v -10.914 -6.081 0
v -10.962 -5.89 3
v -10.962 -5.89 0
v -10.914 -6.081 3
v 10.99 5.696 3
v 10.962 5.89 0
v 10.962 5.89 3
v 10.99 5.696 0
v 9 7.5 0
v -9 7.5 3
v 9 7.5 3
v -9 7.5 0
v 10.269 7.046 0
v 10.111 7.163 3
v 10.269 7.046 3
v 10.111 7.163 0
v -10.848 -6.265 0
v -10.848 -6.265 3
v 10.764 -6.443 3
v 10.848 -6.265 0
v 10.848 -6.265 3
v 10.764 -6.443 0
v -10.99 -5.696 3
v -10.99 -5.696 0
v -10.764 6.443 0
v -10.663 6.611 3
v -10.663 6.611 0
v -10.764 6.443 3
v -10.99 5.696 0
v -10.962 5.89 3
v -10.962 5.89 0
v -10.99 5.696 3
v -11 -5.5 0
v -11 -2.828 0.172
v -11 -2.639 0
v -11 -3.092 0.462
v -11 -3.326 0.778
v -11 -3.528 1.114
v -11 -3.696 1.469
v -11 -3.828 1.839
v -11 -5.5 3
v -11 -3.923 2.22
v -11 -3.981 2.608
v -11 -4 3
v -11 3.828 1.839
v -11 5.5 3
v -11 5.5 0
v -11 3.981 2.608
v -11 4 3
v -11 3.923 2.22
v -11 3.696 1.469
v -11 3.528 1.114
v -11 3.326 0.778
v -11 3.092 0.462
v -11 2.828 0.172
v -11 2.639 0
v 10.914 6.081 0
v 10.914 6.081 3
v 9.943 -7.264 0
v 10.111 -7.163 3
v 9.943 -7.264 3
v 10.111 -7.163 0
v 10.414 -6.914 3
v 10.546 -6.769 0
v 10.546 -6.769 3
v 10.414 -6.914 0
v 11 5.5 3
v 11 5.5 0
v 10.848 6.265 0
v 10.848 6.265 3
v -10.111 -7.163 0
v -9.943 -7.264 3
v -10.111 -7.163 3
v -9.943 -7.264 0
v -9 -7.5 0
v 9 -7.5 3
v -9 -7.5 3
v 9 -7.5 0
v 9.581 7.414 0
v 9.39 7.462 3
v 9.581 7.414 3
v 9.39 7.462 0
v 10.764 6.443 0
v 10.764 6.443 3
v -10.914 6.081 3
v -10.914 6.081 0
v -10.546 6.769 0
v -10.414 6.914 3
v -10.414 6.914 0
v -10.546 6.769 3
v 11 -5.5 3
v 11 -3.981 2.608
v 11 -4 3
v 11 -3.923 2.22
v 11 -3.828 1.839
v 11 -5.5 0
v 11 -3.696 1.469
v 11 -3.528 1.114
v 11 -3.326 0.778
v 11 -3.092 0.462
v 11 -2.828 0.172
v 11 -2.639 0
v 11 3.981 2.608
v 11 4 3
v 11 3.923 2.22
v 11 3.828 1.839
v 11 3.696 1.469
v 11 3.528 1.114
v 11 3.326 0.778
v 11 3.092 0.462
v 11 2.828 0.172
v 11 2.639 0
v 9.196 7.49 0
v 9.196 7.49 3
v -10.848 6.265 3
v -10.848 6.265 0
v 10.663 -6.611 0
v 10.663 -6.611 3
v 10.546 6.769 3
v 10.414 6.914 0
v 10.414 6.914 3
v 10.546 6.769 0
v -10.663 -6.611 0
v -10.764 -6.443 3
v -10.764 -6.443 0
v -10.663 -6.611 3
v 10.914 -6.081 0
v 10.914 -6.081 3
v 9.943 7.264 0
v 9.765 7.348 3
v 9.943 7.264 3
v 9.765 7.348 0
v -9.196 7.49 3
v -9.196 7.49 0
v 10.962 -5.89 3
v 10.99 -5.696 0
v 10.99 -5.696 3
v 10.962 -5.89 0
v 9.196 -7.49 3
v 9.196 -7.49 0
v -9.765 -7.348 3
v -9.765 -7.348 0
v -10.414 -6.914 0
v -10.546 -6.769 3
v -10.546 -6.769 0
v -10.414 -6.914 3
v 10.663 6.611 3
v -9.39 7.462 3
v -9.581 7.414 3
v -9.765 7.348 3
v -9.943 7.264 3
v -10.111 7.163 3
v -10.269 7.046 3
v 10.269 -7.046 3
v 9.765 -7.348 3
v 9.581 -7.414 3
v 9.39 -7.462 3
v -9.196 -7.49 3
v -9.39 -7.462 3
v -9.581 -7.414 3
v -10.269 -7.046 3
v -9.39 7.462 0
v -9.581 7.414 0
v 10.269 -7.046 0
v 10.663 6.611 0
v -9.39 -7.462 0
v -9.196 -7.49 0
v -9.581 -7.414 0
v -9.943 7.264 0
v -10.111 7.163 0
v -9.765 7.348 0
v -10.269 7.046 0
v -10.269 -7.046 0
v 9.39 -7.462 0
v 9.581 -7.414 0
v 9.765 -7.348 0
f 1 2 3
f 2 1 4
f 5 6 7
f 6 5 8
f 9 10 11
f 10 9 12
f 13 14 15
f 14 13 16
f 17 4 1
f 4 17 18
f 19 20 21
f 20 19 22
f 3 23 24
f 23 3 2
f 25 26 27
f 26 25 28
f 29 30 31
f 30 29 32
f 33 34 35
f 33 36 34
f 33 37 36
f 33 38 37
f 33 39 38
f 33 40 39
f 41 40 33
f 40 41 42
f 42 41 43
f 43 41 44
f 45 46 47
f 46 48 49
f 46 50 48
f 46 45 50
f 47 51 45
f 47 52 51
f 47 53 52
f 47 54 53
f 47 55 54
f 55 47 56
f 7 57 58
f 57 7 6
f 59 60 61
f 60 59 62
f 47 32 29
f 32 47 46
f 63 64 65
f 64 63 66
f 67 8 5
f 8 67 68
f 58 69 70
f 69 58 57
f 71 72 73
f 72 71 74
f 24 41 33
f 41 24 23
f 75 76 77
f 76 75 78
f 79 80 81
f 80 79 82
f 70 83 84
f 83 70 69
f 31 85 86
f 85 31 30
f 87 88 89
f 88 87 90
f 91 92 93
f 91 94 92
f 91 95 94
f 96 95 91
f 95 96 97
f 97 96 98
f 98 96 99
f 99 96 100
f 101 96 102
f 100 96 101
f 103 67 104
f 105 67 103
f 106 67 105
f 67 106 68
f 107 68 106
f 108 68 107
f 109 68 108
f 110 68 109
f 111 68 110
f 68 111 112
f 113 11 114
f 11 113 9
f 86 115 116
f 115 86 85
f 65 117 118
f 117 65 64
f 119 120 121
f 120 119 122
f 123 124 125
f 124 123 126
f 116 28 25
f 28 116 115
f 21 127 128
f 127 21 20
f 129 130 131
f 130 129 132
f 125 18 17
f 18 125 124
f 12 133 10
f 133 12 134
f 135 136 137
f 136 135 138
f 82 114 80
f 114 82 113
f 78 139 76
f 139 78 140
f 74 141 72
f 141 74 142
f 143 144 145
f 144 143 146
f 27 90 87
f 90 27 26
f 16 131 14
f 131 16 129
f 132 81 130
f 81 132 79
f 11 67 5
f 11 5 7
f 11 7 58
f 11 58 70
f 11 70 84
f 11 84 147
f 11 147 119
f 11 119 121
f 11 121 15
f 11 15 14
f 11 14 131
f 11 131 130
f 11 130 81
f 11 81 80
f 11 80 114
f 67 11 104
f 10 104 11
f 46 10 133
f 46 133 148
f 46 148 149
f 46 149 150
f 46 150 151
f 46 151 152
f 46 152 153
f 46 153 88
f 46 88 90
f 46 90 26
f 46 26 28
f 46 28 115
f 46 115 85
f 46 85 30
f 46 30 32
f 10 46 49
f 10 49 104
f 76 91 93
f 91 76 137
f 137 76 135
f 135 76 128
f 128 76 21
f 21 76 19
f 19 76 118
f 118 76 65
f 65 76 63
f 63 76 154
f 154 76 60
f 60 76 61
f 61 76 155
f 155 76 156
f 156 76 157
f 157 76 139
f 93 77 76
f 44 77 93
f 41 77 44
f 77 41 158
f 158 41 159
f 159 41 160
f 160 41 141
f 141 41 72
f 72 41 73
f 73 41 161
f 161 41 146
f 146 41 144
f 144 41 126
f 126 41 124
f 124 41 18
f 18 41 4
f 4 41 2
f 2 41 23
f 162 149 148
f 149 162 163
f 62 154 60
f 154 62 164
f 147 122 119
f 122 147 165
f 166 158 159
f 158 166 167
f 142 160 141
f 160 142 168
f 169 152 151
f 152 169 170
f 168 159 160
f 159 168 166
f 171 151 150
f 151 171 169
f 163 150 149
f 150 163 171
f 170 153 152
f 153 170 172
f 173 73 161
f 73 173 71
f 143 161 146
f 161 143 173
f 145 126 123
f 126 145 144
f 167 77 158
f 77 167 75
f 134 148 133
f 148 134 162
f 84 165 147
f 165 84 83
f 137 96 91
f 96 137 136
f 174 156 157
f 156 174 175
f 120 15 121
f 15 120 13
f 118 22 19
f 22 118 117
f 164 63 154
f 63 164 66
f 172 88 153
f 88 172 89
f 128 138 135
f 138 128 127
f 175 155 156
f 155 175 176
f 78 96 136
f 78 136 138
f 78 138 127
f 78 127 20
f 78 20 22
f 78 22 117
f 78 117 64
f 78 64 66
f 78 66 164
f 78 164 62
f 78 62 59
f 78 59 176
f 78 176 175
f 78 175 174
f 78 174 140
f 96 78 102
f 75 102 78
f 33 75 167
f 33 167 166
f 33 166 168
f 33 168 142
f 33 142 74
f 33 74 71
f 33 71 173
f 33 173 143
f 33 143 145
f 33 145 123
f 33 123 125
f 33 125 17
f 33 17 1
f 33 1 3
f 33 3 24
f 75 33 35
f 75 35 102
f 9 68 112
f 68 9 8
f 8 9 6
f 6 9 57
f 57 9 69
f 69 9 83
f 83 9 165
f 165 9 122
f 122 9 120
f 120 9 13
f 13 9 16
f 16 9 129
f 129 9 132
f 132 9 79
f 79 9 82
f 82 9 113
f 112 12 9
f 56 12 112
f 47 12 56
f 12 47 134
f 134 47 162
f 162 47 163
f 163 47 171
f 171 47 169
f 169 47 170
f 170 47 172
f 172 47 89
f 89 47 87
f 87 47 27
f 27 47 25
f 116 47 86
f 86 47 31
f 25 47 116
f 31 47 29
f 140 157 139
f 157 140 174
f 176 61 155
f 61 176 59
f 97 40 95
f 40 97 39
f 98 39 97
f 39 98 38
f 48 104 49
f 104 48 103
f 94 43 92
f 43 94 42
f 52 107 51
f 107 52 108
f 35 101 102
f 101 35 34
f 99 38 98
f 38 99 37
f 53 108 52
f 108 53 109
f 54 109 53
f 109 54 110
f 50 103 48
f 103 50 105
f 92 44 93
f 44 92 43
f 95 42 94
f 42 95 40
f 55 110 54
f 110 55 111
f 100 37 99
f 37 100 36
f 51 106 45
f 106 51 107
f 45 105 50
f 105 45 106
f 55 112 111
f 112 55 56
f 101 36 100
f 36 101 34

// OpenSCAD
$fn=64;

L = 22.0;
W = 15.0;
H = 6.0;

corner_r = 2.0;

plate_t = 3.0;

boss_l = 10.0;
boss_w = 7.0;
boss_h = H - plate_t;

hole_d = 3.2;
hole_x = 7.0;

rod_r = 4.0;

module rounded_rect_2d(l, w, r){
    hull(){
        for (sx=[-1,1], sy=[-1,1])
            translate([sx*(l/2 - r), sy*(w/2 - r)]) circle(r=r);
    }
}

module base_plate(){
    linear_extrude(height=plate_t)
        rounded_rect_2d(L, W, corner_r);
}

module boss(){
    translate([0,0,plate_t])
        cube([boss_l, boss_w, boss_h], center=true);
}

module holes(){
    for (sx=[-1,1])
        translate([sx*hole_x, 0, 0])
            cylinder(d=hole_d, h=H+0.4, center=false);
}

module rod_cutout(){
    translate([0,0,plate_t])
        rotate([0,90,0])
            cylinder(r=rod_r, h=L+0.6, center=true);
}

difference(){
    union(){
        base_plate();
        boss();
    }
    translate([0,0,-0.2]) holes();
    rod_cutout();
}
